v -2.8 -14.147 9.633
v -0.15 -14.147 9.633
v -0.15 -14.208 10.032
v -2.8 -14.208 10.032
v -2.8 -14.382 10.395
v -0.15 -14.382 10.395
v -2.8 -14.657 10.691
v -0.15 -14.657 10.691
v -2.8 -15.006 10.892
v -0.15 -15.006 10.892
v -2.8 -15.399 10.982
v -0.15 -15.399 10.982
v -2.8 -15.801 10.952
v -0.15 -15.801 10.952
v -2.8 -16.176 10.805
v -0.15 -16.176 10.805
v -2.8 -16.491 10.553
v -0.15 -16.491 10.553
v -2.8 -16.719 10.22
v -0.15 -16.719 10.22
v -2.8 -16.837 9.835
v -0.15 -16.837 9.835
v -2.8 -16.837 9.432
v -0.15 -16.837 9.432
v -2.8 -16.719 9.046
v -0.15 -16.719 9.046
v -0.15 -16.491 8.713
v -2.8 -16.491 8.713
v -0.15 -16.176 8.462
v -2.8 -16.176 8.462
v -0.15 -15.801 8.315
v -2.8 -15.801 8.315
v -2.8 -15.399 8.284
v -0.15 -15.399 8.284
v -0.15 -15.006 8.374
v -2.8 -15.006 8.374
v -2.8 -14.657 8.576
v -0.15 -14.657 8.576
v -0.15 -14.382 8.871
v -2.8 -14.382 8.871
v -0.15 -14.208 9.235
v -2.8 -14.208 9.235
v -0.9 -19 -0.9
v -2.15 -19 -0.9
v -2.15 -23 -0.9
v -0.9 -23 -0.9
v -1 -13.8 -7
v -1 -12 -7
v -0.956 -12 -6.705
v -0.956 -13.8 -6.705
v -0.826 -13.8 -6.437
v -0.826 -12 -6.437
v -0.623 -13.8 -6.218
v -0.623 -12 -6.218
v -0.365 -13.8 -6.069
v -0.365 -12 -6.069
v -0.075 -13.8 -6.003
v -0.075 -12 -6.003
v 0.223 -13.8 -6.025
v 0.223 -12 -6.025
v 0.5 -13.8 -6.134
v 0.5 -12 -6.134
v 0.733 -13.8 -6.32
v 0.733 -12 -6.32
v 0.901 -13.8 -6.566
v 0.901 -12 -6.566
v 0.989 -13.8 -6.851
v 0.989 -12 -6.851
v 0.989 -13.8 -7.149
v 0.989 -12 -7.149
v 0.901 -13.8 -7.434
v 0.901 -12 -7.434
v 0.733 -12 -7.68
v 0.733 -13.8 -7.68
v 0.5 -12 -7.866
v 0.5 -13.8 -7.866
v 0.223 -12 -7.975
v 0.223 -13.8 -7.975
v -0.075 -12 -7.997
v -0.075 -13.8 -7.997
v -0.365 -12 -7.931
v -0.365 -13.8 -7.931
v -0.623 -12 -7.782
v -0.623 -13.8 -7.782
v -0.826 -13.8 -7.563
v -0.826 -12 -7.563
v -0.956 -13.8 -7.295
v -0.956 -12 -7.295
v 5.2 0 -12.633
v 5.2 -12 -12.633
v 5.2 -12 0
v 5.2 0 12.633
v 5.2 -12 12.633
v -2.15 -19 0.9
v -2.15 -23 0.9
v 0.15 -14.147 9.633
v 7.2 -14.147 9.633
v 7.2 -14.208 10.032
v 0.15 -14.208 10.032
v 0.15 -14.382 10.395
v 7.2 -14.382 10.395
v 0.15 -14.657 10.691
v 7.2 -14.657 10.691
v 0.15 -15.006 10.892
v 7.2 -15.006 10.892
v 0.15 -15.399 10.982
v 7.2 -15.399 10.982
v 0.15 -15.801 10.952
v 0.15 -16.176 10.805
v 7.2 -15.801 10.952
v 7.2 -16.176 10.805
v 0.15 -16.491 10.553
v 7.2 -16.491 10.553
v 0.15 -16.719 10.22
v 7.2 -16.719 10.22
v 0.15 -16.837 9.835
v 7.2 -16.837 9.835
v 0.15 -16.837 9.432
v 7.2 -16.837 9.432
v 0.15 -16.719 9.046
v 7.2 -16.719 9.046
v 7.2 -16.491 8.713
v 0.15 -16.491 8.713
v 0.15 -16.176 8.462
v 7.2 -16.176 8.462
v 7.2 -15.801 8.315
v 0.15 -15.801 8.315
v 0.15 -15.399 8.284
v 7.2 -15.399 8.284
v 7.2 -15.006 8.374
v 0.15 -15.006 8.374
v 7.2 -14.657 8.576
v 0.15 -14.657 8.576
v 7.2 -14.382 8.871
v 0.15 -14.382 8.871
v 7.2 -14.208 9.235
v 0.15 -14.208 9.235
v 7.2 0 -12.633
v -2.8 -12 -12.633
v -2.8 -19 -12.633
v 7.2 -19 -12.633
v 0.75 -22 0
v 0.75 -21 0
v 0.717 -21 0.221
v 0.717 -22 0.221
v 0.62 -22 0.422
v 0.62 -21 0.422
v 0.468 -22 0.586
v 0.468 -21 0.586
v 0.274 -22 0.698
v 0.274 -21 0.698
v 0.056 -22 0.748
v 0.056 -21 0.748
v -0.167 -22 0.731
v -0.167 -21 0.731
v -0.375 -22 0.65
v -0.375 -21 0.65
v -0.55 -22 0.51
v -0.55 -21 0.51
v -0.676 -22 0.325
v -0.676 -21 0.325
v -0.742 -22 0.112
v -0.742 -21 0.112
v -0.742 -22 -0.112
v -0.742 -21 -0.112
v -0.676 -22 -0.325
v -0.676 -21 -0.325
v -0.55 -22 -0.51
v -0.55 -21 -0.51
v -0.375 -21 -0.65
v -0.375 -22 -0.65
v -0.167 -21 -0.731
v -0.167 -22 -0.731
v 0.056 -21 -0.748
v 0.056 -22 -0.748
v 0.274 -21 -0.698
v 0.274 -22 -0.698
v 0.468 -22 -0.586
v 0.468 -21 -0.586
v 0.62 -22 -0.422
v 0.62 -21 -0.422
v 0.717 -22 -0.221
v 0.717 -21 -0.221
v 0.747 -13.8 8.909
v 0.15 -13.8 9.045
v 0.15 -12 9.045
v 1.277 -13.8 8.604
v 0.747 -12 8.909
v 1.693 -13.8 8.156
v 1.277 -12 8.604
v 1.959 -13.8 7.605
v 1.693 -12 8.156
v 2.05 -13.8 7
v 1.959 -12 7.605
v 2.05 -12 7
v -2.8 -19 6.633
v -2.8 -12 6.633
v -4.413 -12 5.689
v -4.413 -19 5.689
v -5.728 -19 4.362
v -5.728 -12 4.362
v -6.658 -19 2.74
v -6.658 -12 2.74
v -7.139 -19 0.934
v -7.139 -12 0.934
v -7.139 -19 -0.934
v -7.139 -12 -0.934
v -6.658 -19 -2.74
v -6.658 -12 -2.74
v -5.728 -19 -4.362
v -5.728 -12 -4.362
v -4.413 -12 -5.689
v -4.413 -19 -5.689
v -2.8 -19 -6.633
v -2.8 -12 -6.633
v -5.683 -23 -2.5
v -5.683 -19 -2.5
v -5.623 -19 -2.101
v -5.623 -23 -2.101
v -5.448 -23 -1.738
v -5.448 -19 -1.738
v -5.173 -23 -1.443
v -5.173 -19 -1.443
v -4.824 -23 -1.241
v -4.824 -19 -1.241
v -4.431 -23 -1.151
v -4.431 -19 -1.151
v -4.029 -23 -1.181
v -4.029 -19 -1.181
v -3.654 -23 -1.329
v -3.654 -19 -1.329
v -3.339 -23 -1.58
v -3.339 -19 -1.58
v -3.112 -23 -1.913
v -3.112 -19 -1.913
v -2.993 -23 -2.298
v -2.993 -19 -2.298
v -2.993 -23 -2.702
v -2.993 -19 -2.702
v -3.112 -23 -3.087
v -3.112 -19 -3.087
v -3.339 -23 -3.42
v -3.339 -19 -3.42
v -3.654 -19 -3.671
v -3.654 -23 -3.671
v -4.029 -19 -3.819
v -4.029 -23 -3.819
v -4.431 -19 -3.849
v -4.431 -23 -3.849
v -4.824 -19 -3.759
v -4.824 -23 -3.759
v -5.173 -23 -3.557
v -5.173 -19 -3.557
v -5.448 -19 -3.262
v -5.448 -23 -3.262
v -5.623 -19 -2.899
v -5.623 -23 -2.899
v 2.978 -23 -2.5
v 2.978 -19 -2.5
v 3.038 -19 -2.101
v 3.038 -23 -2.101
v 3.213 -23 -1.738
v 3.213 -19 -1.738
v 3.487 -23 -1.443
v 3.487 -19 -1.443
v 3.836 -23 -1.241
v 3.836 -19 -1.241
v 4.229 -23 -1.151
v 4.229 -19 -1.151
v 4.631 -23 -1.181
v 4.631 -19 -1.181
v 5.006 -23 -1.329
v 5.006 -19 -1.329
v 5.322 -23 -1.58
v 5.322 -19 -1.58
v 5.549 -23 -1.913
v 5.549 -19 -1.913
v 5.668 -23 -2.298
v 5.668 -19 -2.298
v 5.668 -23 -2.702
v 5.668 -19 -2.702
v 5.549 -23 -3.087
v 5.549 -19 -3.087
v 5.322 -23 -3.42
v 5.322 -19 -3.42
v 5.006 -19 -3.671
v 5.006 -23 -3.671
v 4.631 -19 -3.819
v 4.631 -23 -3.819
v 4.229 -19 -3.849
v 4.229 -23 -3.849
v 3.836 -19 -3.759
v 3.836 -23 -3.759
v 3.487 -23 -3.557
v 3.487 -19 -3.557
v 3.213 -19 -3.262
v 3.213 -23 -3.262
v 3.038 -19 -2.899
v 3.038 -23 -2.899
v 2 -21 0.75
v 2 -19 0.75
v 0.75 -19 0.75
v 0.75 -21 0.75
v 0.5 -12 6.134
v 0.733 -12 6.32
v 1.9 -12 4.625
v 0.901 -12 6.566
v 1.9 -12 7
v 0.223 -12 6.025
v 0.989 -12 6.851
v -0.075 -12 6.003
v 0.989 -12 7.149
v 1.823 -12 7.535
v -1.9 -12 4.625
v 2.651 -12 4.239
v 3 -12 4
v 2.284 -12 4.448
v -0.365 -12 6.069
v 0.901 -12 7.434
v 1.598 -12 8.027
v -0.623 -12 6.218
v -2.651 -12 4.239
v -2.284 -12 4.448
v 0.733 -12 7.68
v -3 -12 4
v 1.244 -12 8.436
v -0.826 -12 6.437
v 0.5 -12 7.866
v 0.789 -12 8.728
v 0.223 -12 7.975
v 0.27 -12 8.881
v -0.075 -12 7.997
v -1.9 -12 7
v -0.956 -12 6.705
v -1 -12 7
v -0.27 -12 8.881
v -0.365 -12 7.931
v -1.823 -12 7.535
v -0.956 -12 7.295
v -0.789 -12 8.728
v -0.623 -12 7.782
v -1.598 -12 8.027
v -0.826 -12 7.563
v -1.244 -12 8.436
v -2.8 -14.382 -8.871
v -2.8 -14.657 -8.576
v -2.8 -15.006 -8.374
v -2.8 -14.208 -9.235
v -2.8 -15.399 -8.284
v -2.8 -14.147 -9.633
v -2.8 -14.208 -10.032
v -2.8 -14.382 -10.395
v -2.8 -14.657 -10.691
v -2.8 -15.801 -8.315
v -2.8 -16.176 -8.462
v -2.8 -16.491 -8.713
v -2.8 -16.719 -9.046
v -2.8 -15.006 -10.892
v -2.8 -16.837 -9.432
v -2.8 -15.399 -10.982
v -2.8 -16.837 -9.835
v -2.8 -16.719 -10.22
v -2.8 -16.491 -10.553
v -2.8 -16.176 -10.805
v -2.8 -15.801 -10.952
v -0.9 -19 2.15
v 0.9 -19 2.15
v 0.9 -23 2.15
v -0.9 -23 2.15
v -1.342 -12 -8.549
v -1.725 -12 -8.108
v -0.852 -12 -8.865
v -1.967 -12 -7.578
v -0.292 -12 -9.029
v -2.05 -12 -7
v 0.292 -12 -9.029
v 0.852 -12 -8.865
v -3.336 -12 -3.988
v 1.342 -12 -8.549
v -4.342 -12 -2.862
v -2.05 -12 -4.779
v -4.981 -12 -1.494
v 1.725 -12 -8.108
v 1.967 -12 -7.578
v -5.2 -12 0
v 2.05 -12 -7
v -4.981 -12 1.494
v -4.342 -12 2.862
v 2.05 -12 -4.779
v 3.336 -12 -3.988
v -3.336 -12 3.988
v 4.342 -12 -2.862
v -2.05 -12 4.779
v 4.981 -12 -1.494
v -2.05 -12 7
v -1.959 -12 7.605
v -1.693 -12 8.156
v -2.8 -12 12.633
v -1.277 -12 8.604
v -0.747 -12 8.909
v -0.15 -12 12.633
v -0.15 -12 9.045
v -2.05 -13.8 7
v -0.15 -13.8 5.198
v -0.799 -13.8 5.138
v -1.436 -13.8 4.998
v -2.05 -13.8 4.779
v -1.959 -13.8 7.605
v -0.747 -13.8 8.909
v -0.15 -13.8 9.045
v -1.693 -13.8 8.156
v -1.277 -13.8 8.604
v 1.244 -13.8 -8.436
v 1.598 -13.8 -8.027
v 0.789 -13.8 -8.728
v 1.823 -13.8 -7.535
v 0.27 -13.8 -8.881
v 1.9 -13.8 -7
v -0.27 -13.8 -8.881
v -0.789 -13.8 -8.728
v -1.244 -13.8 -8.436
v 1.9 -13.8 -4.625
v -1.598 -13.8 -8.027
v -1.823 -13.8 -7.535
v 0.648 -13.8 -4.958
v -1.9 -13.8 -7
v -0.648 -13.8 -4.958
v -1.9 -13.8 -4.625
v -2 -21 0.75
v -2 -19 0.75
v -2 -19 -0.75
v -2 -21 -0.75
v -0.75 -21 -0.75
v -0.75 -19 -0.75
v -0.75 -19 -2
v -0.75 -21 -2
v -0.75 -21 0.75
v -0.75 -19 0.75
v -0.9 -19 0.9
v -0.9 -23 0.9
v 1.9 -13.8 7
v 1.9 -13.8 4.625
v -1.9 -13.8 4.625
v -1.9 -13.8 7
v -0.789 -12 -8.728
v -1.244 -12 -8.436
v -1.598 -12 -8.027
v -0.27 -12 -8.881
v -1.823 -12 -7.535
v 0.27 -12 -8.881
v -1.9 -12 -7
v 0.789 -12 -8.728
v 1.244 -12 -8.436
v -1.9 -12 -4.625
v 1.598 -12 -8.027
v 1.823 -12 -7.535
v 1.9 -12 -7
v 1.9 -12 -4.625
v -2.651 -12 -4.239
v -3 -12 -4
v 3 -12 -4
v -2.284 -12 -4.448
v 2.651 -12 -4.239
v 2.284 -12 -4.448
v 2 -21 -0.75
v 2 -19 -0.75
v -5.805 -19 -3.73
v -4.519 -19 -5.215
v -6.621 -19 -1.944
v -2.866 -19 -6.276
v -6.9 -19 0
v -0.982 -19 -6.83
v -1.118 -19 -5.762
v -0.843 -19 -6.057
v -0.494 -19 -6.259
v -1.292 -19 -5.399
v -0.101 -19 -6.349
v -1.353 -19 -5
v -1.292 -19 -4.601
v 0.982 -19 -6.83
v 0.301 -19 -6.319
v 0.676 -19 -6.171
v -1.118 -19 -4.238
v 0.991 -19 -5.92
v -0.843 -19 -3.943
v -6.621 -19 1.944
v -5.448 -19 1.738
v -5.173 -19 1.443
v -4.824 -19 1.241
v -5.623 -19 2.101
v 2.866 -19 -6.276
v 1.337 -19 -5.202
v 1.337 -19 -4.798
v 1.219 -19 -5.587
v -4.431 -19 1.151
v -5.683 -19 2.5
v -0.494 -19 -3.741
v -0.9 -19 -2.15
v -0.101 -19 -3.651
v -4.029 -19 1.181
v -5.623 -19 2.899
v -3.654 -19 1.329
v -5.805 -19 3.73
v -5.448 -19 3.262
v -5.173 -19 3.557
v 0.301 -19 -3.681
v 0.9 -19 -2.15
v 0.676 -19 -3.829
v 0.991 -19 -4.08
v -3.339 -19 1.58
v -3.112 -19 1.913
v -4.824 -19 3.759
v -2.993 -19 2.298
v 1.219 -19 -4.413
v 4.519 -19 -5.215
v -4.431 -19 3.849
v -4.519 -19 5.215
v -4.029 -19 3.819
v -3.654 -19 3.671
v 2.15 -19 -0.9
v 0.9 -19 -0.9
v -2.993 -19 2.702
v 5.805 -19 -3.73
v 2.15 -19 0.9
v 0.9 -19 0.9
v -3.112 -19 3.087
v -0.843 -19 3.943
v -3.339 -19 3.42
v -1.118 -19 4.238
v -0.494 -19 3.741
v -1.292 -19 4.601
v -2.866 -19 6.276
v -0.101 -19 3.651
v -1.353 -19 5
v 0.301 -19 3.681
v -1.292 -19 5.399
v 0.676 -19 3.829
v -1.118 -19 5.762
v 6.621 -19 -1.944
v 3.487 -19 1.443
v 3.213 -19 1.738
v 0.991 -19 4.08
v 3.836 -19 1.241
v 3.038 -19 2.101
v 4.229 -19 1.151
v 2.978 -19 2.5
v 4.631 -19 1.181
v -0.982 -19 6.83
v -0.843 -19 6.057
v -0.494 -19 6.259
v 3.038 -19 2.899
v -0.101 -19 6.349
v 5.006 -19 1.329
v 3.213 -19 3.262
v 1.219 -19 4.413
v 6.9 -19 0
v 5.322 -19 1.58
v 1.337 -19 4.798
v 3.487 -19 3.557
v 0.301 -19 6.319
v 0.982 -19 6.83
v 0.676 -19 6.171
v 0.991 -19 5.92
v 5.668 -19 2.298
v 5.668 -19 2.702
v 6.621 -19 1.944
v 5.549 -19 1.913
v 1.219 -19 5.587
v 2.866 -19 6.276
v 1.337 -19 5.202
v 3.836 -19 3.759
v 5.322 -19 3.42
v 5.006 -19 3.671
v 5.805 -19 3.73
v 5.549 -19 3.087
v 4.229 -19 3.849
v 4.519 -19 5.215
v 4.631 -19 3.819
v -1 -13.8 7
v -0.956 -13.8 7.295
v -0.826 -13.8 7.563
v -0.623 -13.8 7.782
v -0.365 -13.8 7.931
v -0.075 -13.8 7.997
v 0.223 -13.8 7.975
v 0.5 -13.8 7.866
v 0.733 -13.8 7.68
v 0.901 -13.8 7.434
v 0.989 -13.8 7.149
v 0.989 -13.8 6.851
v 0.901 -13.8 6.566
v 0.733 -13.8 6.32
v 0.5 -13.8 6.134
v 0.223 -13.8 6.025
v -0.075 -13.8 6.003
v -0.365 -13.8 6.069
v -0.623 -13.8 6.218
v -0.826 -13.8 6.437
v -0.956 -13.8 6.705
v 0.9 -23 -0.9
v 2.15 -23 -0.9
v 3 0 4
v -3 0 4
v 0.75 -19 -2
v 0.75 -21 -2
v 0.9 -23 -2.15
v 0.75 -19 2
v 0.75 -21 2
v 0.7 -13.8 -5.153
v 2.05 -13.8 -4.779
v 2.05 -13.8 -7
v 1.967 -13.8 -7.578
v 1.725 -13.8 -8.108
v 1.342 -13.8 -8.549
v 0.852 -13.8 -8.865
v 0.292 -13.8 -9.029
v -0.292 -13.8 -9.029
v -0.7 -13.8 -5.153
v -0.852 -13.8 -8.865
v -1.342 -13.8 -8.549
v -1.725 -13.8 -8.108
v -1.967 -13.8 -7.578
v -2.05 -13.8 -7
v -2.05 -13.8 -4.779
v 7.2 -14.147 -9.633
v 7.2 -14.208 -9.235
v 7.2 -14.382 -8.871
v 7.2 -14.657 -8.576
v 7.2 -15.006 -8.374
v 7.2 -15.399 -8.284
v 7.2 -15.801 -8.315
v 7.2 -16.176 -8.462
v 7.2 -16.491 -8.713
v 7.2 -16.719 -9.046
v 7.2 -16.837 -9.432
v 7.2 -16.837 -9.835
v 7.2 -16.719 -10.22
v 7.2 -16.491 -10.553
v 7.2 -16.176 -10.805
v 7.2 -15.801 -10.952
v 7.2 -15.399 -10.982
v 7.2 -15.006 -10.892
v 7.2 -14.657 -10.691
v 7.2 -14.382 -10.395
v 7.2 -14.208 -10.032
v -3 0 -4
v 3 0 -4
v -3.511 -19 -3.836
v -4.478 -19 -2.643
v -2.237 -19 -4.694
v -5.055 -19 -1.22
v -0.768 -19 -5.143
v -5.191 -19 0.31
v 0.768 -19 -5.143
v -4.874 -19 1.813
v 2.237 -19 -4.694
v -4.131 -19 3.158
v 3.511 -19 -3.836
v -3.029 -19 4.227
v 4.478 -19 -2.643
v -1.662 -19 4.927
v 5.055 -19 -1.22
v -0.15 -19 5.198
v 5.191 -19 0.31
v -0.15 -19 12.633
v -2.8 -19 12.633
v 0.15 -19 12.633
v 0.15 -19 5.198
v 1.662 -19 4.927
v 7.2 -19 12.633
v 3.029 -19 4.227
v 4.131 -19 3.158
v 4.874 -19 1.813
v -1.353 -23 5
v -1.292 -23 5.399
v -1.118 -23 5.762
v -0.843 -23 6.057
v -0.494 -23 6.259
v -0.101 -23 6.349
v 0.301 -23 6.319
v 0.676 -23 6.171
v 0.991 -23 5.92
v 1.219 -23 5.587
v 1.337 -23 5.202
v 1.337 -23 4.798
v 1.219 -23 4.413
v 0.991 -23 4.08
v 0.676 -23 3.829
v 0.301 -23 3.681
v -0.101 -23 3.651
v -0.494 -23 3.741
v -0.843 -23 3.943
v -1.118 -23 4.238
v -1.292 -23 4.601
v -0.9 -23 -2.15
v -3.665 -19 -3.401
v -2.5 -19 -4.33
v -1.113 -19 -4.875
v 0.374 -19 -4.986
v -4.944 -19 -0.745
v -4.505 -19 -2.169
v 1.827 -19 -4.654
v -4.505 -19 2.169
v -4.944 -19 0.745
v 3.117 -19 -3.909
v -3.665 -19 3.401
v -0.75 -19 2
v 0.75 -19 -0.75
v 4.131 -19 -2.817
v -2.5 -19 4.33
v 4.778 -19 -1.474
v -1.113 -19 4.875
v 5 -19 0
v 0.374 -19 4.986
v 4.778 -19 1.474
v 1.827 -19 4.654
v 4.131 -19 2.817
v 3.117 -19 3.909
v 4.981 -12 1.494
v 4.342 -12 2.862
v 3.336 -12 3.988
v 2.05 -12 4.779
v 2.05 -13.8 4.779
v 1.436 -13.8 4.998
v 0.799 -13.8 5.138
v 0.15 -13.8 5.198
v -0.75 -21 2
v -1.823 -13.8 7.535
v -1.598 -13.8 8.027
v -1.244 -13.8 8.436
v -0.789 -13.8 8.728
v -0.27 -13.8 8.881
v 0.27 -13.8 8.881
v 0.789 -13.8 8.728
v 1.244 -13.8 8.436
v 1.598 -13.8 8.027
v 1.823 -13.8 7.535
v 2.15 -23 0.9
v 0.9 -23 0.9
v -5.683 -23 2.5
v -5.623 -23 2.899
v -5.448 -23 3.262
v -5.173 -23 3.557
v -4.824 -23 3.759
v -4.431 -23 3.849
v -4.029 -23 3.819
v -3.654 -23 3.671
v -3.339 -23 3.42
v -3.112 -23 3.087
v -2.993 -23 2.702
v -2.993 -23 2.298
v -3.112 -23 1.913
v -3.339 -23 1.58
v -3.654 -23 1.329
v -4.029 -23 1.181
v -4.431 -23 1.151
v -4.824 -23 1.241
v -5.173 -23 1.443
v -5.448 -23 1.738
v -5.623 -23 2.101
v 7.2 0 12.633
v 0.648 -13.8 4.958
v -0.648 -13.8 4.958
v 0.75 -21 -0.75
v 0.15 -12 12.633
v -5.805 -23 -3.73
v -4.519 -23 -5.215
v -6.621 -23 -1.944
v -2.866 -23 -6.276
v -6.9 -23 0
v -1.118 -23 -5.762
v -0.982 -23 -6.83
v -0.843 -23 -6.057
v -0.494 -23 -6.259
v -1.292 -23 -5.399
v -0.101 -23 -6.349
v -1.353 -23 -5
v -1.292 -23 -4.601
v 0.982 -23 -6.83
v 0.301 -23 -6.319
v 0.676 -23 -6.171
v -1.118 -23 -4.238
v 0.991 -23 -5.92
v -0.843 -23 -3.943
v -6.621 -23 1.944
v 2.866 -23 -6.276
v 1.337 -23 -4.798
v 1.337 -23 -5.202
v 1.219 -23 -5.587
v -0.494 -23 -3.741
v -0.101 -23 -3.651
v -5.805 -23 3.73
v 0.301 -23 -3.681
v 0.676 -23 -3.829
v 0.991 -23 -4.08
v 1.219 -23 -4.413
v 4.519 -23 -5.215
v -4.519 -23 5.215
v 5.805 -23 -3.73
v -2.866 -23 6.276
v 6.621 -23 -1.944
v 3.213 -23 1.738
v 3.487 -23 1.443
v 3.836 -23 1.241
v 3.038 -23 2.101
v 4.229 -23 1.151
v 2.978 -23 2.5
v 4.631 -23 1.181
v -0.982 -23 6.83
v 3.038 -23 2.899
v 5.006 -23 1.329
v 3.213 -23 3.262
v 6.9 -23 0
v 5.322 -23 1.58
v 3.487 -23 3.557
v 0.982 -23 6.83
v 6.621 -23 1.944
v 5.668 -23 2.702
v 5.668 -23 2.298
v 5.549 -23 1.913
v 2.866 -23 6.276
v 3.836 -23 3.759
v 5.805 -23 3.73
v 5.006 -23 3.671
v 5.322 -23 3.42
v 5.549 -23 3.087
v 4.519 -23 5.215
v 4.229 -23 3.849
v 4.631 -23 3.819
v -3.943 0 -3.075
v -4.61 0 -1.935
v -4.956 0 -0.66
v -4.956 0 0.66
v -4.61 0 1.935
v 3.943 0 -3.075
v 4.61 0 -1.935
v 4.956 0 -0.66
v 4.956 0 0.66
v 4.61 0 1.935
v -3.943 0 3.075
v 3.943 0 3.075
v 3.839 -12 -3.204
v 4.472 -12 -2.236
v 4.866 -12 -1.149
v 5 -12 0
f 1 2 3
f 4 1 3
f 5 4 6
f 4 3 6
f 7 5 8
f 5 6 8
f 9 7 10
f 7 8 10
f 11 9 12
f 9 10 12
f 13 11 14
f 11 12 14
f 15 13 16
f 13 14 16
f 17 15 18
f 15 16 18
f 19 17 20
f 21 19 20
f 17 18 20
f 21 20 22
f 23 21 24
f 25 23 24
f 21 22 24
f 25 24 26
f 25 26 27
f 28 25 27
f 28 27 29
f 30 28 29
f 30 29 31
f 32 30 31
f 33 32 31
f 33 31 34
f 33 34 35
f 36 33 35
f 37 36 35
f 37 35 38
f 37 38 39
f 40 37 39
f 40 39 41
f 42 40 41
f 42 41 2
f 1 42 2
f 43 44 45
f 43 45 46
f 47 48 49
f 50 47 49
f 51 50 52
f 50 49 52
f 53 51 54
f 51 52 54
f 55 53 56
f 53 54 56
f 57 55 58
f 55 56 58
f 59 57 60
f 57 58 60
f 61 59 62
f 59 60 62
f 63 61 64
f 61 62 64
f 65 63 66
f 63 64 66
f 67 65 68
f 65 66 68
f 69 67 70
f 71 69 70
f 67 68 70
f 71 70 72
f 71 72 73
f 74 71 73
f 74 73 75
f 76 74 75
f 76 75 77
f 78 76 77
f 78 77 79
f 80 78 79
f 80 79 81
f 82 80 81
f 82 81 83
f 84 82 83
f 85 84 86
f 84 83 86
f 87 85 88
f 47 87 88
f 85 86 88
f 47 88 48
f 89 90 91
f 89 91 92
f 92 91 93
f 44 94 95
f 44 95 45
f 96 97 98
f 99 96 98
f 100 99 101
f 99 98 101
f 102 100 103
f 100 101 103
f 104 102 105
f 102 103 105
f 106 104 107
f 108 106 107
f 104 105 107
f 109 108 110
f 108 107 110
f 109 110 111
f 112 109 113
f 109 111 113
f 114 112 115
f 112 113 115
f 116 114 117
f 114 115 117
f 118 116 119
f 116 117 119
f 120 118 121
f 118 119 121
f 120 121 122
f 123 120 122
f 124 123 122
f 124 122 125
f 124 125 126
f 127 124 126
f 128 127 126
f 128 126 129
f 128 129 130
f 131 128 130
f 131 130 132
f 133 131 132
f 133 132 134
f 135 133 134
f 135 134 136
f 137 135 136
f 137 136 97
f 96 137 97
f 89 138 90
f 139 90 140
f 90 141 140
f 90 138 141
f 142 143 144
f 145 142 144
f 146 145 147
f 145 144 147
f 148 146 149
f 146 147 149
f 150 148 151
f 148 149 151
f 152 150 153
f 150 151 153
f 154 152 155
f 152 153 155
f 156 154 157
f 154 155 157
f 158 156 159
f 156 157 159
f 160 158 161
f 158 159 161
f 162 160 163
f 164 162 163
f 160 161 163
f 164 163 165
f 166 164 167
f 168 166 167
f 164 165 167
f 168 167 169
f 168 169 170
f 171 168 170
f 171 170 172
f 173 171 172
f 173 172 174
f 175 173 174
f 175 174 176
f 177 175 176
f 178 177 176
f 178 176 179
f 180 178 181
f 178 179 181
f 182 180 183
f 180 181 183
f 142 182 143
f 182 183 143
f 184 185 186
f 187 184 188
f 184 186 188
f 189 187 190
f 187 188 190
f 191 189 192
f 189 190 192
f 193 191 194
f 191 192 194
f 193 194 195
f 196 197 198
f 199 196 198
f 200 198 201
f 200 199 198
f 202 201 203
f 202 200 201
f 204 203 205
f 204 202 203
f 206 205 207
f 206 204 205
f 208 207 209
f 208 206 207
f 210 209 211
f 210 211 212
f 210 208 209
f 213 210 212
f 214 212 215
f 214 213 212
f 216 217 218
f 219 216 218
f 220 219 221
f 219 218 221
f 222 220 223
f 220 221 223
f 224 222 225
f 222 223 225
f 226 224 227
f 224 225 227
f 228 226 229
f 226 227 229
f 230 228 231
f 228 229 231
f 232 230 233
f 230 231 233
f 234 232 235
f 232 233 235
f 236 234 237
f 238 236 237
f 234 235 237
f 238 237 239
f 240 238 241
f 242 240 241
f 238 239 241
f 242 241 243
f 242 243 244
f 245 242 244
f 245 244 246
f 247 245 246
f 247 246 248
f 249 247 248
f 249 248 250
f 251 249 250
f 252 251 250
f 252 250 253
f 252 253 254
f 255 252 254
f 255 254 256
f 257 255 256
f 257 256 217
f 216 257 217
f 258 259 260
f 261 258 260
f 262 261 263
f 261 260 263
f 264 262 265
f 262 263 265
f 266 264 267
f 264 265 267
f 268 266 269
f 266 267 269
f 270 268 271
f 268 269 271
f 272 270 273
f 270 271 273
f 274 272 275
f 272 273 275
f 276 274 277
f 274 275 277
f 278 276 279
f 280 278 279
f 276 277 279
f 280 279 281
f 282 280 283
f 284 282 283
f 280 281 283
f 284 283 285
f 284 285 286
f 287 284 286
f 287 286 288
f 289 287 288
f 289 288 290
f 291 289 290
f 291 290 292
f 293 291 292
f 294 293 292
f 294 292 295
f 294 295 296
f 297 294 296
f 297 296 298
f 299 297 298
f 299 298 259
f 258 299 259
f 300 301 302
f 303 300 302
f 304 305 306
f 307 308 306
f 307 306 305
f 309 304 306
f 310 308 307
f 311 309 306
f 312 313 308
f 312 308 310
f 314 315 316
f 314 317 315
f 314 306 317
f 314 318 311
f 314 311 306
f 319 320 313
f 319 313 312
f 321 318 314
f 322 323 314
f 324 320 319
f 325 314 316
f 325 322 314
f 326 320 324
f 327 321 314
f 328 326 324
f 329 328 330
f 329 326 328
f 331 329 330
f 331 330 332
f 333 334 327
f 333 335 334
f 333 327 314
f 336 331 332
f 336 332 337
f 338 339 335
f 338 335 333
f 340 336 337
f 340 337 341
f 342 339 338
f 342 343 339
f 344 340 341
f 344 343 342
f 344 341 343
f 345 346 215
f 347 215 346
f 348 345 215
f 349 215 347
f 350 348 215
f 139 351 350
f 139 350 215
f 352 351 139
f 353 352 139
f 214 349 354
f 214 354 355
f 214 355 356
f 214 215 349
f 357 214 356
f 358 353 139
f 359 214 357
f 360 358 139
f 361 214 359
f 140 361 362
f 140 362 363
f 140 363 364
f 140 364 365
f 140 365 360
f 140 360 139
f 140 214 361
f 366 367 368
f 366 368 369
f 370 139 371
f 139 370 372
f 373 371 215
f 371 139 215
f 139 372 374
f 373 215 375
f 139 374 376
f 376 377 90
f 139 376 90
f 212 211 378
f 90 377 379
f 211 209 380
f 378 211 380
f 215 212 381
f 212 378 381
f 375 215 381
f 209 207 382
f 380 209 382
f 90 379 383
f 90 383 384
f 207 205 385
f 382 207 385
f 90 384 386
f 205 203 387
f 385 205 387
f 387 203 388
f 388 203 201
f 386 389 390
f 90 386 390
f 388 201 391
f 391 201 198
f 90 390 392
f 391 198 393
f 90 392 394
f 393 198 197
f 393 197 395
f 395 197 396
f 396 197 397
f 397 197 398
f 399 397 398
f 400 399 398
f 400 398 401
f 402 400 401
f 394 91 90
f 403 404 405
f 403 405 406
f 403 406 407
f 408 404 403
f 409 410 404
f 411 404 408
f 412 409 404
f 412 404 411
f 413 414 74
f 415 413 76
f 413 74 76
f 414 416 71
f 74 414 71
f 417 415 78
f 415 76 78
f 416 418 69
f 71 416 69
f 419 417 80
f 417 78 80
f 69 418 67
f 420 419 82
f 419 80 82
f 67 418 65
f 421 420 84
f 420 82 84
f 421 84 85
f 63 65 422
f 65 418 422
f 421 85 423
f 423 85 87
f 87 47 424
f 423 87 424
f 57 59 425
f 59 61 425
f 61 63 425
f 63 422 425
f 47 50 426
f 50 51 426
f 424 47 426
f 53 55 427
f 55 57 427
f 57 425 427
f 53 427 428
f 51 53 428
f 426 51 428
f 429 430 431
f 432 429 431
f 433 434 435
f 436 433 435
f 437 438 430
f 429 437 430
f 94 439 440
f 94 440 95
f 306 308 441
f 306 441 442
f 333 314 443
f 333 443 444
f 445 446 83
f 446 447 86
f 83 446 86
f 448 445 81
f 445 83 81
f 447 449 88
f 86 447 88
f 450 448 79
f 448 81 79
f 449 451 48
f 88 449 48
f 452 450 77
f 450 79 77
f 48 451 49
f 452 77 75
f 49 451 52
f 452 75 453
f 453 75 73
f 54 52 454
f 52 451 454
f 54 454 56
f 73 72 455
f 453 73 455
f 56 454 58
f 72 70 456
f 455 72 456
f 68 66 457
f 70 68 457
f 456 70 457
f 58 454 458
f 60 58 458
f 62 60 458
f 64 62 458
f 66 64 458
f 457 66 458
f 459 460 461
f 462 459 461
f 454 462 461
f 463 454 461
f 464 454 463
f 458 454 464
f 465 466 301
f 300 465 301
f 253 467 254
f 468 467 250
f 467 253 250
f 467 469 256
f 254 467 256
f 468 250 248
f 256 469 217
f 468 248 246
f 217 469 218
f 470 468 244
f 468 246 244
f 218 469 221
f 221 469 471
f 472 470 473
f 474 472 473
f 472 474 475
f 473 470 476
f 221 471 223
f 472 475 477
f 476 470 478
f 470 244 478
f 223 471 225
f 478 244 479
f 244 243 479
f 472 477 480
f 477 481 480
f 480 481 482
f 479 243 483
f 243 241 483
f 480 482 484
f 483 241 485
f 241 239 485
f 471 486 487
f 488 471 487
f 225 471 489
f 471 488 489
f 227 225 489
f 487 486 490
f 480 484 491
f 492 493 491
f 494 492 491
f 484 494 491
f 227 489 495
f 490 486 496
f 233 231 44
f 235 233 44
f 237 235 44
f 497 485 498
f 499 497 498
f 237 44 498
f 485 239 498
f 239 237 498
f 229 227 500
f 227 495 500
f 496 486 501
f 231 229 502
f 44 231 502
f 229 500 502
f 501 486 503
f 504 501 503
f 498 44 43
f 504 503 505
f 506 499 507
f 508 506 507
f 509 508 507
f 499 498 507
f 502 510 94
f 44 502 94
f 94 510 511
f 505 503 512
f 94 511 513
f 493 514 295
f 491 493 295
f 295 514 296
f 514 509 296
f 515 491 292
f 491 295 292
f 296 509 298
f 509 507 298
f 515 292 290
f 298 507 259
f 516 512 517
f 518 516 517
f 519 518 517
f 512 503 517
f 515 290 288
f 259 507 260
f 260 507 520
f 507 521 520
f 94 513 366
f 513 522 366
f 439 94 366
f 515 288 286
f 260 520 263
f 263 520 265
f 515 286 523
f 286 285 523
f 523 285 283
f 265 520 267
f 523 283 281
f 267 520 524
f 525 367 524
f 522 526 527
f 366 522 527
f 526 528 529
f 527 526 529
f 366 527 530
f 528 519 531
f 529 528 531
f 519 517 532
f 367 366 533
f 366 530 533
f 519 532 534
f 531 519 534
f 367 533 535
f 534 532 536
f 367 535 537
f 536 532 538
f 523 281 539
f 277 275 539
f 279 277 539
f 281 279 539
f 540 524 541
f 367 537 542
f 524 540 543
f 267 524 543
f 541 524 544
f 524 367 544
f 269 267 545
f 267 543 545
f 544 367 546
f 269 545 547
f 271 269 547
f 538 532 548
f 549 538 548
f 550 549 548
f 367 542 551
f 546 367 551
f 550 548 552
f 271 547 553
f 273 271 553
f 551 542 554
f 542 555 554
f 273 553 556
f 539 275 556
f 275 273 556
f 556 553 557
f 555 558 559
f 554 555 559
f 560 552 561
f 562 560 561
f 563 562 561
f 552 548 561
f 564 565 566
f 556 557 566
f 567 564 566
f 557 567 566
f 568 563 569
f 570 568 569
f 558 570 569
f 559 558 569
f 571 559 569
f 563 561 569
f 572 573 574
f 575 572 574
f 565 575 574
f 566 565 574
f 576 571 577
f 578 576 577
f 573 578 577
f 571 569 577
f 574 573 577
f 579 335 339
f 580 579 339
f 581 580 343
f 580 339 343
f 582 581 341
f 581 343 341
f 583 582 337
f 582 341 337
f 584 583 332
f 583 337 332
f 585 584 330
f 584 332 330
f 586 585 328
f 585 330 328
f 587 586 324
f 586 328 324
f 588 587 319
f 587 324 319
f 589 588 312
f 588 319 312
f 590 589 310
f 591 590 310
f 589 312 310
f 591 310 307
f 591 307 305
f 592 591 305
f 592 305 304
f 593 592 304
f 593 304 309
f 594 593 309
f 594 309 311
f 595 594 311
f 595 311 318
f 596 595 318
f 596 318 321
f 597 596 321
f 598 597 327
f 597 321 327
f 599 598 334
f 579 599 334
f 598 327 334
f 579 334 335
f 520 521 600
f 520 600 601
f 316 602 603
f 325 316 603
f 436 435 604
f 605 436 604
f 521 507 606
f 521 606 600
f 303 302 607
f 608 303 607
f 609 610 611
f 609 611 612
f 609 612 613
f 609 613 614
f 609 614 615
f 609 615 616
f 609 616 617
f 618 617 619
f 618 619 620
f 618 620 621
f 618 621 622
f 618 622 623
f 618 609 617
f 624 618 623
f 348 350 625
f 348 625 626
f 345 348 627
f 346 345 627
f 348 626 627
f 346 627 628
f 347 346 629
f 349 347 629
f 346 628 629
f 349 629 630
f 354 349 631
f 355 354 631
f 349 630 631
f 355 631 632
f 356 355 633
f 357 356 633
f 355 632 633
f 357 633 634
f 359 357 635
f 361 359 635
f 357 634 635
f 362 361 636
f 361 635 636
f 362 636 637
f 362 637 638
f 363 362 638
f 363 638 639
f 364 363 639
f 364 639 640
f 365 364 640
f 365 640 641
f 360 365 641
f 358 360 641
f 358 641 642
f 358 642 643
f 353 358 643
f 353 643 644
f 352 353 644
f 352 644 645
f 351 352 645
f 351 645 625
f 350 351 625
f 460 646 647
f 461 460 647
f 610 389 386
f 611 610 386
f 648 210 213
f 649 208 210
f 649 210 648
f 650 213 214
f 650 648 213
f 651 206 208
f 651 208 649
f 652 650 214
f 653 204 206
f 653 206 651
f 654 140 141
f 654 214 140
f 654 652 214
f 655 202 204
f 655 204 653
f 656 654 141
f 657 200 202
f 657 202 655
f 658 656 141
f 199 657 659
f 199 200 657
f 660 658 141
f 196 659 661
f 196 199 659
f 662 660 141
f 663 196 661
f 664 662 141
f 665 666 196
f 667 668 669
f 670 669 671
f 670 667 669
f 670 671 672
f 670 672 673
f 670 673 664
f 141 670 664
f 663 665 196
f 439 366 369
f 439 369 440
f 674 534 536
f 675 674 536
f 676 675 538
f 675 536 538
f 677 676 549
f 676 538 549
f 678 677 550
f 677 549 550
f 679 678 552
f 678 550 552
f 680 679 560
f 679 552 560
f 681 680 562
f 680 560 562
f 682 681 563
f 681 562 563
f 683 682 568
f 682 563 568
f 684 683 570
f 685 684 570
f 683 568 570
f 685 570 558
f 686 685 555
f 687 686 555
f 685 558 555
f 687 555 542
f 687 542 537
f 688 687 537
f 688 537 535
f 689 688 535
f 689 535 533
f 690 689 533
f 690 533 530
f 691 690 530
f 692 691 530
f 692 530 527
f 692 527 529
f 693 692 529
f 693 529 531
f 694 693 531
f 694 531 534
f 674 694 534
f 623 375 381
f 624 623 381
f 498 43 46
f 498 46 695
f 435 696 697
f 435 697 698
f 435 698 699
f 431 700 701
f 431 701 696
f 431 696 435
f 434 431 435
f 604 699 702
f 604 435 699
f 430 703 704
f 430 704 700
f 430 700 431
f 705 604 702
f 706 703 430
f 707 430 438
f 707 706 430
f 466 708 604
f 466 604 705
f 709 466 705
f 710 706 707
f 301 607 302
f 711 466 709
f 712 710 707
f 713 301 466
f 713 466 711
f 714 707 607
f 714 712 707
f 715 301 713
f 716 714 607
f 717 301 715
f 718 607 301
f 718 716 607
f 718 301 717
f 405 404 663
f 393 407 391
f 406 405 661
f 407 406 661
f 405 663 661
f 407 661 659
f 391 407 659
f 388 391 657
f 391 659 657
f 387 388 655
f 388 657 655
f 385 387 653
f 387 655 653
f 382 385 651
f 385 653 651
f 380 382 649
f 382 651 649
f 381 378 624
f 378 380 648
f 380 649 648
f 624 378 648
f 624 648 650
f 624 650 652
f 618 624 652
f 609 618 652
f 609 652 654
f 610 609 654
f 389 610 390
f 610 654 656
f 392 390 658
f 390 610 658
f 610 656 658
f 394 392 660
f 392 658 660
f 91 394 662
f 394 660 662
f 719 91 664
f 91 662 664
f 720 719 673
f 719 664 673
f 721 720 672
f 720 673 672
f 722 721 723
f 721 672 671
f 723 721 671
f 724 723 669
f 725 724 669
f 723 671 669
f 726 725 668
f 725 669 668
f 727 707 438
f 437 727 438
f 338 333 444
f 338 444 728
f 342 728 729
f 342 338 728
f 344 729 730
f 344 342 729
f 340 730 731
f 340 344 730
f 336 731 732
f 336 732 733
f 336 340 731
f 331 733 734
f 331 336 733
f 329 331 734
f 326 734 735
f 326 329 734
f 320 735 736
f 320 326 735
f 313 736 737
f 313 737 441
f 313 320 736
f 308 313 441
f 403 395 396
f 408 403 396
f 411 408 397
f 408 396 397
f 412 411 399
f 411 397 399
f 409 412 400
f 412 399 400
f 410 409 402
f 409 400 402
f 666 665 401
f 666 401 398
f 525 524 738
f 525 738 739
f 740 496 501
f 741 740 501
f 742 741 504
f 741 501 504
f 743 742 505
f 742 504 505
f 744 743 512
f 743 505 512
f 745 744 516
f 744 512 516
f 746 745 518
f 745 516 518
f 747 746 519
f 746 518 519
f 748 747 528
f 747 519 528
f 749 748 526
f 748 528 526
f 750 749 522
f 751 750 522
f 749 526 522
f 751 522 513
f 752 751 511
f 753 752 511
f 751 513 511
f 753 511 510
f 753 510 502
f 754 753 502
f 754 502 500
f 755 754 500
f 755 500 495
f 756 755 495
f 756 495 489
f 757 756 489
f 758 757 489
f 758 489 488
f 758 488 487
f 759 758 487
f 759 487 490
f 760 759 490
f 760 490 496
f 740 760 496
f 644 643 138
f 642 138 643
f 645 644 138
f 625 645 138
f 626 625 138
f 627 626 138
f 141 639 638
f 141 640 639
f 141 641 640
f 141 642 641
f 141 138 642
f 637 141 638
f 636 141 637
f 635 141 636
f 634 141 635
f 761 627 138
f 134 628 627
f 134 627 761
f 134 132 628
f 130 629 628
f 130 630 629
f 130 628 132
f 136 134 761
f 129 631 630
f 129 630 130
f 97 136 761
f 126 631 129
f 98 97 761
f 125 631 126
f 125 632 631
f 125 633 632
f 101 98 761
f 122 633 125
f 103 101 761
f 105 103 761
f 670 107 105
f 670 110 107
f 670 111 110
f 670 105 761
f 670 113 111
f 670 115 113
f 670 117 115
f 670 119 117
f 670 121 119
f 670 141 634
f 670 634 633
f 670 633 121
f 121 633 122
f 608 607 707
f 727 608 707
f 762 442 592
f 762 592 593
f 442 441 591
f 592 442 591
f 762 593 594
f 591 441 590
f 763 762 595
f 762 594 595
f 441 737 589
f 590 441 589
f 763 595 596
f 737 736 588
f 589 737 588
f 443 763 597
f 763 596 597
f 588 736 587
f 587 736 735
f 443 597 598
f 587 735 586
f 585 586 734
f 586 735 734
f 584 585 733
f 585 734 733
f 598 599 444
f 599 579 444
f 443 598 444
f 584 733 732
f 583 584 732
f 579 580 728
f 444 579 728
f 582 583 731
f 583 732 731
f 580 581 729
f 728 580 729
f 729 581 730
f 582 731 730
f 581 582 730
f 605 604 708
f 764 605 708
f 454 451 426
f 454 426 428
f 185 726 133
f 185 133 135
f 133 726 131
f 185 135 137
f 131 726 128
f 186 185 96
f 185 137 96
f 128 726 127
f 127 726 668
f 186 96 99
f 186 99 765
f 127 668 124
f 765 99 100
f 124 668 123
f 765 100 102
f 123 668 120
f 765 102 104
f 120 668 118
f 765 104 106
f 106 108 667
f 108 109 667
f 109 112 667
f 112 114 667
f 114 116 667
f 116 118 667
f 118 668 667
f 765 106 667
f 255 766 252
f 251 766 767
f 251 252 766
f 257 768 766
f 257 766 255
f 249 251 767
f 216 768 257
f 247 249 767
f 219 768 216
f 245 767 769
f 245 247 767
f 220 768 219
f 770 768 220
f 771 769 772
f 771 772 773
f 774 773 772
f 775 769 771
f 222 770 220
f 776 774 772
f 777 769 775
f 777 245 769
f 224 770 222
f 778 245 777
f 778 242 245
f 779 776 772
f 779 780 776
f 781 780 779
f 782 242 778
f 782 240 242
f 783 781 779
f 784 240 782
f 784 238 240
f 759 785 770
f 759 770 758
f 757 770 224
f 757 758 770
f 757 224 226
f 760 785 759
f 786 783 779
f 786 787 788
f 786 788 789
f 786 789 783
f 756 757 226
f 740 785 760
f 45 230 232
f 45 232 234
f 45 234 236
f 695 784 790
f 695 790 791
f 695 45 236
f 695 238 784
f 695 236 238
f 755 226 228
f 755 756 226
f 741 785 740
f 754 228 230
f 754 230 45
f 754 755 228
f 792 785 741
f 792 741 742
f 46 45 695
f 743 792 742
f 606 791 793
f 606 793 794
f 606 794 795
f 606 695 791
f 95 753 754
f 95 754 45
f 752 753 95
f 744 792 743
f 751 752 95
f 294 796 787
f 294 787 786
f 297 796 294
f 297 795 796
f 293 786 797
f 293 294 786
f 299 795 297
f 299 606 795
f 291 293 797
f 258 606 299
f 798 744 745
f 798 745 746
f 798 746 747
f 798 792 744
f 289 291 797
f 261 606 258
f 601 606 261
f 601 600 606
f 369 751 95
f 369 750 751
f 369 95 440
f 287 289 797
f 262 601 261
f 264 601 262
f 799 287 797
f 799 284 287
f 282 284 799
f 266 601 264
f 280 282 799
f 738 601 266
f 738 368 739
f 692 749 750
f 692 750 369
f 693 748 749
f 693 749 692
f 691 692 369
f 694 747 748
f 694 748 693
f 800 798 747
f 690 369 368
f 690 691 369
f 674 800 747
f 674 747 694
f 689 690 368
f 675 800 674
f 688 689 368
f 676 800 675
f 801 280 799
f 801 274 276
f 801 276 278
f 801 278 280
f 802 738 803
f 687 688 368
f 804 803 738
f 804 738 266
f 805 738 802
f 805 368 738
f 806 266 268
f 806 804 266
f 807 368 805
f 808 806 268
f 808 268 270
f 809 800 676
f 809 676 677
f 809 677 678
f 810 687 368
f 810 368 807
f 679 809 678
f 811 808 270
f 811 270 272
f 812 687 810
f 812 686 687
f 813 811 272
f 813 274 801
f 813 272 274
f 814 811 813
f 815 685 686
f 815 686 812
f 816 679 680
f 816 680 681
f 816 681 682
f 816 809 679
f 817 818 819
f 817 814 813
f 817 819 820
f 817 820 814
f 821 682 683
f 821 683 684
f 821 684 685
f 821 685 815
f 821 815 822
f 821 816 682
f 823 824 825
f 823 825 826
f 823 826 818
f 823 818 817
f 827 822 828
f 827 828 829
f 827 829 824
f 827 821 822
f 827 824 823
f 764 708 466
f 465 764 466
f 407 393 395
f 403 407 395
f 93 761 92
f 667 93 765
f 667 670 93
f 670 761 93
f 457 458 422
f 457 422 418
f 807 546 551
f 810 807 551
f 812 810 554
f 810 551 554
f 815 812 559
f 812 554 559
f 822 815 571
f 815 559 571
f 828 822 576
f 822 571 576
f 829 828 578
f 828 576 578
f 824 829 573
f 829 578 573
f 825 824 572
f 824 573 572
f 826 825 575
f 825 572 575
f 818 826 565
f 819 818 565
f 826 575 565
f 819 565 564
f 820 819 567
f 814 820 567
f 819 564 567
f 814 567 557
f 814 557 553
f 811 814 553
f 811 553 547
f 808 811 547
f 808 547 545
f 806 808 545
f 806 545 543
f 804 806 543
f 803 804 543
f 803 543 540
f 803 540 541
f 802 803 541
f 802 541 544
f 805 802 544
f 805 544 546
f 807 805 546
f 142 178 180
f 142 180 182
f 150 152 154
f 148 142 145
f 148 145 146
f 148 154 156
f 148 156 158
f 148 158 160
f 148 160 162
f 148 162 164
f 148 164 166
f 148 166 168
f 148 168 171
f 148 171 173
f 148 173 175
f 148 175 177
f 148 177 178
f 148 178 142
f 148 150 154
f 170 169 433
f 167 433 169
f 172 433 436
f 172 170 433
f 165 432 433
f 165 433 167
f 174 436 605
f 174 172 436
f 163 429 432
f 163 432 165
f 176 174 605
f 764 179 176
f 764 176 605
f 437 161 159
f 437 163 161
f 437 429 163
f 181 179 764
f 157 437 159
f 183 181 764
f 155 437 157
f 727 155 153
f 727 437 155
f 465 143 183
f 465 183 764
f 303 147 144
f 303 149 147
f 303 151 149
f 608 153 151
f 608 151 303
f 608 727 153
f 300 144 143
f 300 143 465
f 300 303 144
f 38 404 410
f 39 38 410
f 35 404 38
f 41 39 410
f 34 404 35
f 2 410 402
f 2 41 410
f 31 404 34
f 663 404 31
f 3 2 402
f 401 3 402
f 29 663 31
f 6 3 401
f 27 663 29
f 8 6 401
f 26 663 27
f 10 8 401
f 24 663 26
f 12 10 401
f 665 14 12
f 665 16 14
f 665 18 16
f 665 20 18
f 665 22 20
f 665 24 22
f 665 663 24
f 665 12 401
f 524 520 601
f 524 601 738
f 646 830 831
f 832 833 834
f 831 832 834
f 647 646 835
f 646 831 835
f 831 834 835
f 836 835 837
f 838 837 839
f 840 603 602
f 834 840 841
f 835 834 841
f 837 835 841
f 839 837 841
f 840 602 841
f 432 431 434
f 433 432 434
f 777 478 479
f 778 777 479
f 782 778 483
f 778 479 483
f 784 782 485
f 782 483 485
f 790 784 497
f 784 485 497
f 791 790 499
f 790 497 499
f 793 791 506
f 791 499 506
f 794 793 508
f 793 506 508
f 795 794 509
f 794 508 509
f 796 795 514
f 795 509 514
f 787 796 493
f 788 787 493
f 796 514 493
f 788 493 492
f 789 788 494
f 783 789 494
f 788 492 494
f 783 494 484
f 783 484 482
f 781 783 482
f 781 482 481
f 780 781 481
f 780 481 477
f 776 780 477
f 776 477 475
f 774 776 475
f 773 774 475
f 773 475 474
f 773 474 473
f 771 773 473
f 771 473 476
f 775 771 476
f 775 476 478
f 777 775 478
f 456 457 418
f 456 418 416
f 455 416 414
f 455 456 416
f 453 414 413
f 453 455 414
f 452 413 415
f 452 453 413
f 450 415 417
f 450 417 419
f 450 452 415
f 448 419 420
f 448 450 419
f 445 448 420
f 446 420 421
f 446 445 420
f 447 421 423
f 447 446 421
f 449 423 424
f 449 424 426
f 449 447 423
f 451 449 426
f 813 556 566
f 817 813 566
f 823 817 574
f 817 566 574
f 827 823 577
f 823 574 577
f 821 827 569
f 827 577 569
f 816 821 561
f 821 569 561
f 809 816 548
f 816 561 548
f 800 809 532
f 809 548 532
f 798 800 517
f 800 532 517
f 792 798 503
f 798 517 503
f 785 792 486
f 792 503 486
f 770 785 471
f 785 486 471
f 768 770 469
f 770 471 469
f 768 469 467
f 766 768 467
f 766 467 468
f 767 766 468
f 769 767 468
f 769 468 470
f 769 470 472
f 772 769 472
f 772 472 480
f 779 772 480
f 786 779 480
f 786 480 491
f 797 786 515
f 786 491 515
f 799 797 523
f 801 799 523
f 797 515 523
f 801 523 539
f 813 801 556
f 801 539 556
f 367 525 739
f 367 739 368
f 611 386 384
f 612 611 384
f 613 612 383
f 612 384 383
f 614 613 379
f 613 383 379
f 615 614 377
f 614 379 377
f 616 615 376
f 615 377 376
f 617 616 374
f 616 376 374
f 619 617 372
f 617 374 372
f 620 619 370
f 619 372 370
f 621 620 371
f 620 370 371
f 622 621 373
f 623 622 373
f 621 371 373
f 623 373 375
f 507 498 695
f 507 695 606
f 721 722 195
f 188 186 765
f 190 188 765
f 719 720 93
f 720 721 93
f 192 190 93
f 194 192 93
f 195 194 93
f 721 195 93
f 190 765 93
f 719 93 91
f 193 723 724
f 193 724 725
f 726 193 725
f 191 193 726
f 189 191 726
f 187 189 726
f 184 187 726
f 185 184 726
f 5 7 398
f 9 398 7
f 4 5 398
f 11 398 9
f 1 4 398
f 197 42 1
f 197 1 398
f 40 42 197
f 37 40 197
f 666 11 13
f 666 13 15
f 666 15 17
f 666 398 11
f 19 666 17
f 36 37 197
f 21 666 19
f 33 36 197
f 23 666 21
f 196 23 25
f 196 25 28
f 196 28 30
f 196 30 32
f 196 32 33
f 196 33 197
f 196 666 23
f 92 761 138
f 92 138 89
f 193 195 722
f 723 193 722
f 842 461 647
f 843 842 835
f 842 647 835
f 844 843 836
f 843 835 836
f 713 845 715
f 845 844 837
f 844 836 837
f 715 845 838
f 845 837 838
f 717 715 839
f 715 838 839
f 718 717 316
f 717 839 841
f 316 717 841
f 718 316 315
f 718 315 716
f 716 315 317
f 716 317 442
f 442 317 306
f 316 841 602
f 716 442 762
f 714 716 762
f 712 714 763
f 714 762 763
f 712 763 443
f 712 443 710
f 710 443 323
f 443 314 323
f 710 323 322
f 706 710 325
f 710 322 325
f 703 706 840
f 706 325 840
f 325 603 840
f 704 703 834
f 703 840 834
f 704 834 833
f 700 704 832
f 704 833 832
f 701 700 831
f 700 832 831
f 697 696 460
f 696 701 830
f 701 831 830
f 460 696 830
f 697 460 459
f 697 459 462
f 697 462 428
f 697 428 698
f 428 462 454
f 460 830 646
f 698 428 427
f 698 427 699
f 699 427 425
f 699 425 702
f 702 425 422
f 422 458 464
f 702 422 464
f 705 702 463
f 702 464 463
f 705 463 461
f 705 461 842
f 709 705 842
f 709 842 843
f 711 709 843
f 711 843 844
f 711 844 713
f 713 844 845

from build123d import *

# Parameters (mm, degrees)
F1_DEPTH  = 12
F2_R      = 5
F3_DEPTH  = 7
F5_DEPTH  = 2
F6_R      = 0.75
F7_DEPTH  = 1
F8_R      = 1
F9_DEPTH  = 1.8
F12_R     = 5.2
F13_DEPTH = 7
F15_DEPTH = 1.8
F17_D     = 2.7051
F18_W     = 0.3
F18_H     = 8.3822393163
F19_DEPTH = 7
F20_W     = 2
F20_H     = 25.2664991614
F21_DEPTH = 12
F23_R     = 6.9
F24_DEPTH = 4
F25_DEPTH = 4
F27_D     = 2.7051


with BuildPart() as f1:
    # F0 (on Front) → F1 (new body)
    with BuildSketch(Plane.XZ):
        with BuildLine():
            Line((3, 4), (-3, 4))
            ThreePointArc((-3, 4), (-5, 0), (-3, -4))
            Line((-3, -4), (3, -4))
            ThreePointArc((3, -4), (5, 0), (3, 4))
        make_face()
    extrude(amount=F1_DEPTH)

    # F2 (on face) → F3 (join)
    with BuildSketch(Plane.XZ.offset(12)):
        Circle(F2_R)
    extrude(amount=F3_DEPTH)

    # F4 (on face) → F5 (join)
    with BuildSketch(Plane.XZ.offset(19)):
        Polygon((0.75, 2), (-0.75, 2), (-0.75, 0.75), (-2, 0.75), (-2, -0.75), (-0.75, -0.75), (-0.75, -2), (0.75, -2), (0.75, -0.75), (2, -0.75), (2, 0.75), (0.75, 0.75), align=None)
    extrude(amount=F5_DEPTH)

    # F6 (on face) → F7 (join)
    with BuildSketch(Plane.XZ.offset(21)):
        Circle(F6_R)
    extrude(amount=F7_DEPTH)

    # F8 (on face) → F9 (join)
    with BuildSketch(Plane(origin=(0, -12, 0), x_dir=(-1, 0, 0), z_dir=(0, 1, 0))):
        with BuildLine():
            Line((-1.9, 7), (-1.9, 4))
            Line((-1.9, 4), (1.9, 4))
            Line((1.9, 4), (1.9, 7))
            ThreePointArc((1.9, 7), (0, 8.9), (-1.9, 7))
        make_face()
        with Locations((0, 7)):
            Circle(F8_R, mode=Mode.SUBTRACT)
        with BuildLine():
            Line((1.9, -4), (-1.9, -4))
            Line((-1.9, -4), (-1.9, -7))
            ThreePointArc((-1.9, -7), (0, -8.9), (1.9, -7))
            Line((1.9, -7), (1.9, -4))
        make_face()
        with Locations((0, -7)):
            Circle(F8_R, mode=Mode.SUBTRACT)
    extrude(amount=-F9_DEPTH)


with BuildPart() as f10_1:
    # F10: copy of F1
    add(f1.part)


with BuildPart() as f13:
    # F12 (on face) → F13 (new body, through all)
    with BuildSketch(Plane.XZ.offset(19)):
        with BuildLine():
            Line((7.2, -12.6332495807), (7.2, 0))
            Line((7.2, 0), (7.2, 12.6332495807))
            Line((7.2, 12.6332495807), (-2.8, 12.6332495807))
            Line((-2.8, 12.6332495807), (-2.8, 6.6332495807))
            ThreePointArc((-2.8, 6.6332495807), (-7.2, 0), (-2.8, -6.6332495807))
            Line((-2.8, -6.6332495807), (-2.8, -12.6332495807))
            Line((-2.8, -12.6332495807), (7.2, -12.6332495807))
        make_face()
        Circle(F12_R, mode=Mode.SUBTRACT)
    extrude(amount=-F13_DEPTH)

    # F14 (on face) → F15 (cut, through all)
    with BuildSketch(Plane(origin=(0, -12, 0), x_dir=(-1, 0, 0), z_dir=(0, 1, 0))):
        with BuildLine():
            Line((-2.05, 4.6249324319), (-2.05, -7))
            ThreePointArc((-2.05, -7), (0, -9.05), (2.05, -7))
            Line((2.05, -7), (2.05, 4.6541262418))
            Line((2.05, 4.6541262418), (2.05, 4.7788596966))
            Line((2.05, 4.7788596966), (2.05, 7))
            ThreePointArc((2.05, 7), (0, 9.05), (-2.05, 7))
            Line((-2.05, 7), (-2.05, 4.7788596966))
            Line((-2.05, 4.7788596966), (-2.05, 4.6249324319))
        make_face()
    extrude(amount=-F15_DEPTH, mode=Mode.SUBTRACT)

    # F17 (through all)
    with Locations(Plane(origin=(-2.8, 0, 0), x_dir=(0, -1, 0), z_dir=(-1, 0, 0))):
        with Locations((15.5, -9.6332495807), (15.5, 9.6332495807)):
            Hole(F17_D / 2)

    # F18 (on face) → F19 (cut, through all)
    with BuildSketch(Plane.XZ.offset(19)):
        with Locations((0, 8.9166247904)):
            Rectangle(F18_W, F18_H)
    extrude(amount=-F19_DEPTH, mode=Mode.SUBTRACT)

    # F20 (on face) → F21 (join, through all)
    with BuildSketch(Plane(origin=(0, -12, 0), x_dir=(-1, 0, 0), z_dir=(0, 1, 0))):
        with Locations((-6.2, 0)):
            Rectangle(F20_W, F20_H)
    extrude(amount=F21_DEPTH)


with BuildPart() as f24:
    # F23 (on face) → F24 (new body)
    with BuildSketch(Plane.XZ.offset(19)):
        Circle(F23_R)
    extrude(amount=F24_DEPTH)

    # F22 (on face) → F25 (cut, through all)
    with BuildSketch(Plane.XZ.offset(19)):
        Polygon((-0.9, 0.9), (-2.15, 0.9), (-2.15, -0.9), (-0.9, -0.9), (-0.9, -2.15), (0.9, -2.15), (0.9, -0.9), (2.15, -0.9), (2.15, 0.9), (0.9, 0.9), (0.9, 2.15), (-0.9, 2.15), align=None)
    extrude(amount=F25_DEPTH, mode=Mode.SUBTRACT)

    # F27 (through all)
    with Locations(Plane.XZ.offset(23)):
        with Locations((-4.3301270189, -2.5), (-4.3301270189, 2.5), (0, 5), (4.3301270189, 2.5), (4.3301270189, -2.5), (0, -5)):
            Hole(F27_D / 2)


solid = Compound([f1.part, f13.part, f24.part])
